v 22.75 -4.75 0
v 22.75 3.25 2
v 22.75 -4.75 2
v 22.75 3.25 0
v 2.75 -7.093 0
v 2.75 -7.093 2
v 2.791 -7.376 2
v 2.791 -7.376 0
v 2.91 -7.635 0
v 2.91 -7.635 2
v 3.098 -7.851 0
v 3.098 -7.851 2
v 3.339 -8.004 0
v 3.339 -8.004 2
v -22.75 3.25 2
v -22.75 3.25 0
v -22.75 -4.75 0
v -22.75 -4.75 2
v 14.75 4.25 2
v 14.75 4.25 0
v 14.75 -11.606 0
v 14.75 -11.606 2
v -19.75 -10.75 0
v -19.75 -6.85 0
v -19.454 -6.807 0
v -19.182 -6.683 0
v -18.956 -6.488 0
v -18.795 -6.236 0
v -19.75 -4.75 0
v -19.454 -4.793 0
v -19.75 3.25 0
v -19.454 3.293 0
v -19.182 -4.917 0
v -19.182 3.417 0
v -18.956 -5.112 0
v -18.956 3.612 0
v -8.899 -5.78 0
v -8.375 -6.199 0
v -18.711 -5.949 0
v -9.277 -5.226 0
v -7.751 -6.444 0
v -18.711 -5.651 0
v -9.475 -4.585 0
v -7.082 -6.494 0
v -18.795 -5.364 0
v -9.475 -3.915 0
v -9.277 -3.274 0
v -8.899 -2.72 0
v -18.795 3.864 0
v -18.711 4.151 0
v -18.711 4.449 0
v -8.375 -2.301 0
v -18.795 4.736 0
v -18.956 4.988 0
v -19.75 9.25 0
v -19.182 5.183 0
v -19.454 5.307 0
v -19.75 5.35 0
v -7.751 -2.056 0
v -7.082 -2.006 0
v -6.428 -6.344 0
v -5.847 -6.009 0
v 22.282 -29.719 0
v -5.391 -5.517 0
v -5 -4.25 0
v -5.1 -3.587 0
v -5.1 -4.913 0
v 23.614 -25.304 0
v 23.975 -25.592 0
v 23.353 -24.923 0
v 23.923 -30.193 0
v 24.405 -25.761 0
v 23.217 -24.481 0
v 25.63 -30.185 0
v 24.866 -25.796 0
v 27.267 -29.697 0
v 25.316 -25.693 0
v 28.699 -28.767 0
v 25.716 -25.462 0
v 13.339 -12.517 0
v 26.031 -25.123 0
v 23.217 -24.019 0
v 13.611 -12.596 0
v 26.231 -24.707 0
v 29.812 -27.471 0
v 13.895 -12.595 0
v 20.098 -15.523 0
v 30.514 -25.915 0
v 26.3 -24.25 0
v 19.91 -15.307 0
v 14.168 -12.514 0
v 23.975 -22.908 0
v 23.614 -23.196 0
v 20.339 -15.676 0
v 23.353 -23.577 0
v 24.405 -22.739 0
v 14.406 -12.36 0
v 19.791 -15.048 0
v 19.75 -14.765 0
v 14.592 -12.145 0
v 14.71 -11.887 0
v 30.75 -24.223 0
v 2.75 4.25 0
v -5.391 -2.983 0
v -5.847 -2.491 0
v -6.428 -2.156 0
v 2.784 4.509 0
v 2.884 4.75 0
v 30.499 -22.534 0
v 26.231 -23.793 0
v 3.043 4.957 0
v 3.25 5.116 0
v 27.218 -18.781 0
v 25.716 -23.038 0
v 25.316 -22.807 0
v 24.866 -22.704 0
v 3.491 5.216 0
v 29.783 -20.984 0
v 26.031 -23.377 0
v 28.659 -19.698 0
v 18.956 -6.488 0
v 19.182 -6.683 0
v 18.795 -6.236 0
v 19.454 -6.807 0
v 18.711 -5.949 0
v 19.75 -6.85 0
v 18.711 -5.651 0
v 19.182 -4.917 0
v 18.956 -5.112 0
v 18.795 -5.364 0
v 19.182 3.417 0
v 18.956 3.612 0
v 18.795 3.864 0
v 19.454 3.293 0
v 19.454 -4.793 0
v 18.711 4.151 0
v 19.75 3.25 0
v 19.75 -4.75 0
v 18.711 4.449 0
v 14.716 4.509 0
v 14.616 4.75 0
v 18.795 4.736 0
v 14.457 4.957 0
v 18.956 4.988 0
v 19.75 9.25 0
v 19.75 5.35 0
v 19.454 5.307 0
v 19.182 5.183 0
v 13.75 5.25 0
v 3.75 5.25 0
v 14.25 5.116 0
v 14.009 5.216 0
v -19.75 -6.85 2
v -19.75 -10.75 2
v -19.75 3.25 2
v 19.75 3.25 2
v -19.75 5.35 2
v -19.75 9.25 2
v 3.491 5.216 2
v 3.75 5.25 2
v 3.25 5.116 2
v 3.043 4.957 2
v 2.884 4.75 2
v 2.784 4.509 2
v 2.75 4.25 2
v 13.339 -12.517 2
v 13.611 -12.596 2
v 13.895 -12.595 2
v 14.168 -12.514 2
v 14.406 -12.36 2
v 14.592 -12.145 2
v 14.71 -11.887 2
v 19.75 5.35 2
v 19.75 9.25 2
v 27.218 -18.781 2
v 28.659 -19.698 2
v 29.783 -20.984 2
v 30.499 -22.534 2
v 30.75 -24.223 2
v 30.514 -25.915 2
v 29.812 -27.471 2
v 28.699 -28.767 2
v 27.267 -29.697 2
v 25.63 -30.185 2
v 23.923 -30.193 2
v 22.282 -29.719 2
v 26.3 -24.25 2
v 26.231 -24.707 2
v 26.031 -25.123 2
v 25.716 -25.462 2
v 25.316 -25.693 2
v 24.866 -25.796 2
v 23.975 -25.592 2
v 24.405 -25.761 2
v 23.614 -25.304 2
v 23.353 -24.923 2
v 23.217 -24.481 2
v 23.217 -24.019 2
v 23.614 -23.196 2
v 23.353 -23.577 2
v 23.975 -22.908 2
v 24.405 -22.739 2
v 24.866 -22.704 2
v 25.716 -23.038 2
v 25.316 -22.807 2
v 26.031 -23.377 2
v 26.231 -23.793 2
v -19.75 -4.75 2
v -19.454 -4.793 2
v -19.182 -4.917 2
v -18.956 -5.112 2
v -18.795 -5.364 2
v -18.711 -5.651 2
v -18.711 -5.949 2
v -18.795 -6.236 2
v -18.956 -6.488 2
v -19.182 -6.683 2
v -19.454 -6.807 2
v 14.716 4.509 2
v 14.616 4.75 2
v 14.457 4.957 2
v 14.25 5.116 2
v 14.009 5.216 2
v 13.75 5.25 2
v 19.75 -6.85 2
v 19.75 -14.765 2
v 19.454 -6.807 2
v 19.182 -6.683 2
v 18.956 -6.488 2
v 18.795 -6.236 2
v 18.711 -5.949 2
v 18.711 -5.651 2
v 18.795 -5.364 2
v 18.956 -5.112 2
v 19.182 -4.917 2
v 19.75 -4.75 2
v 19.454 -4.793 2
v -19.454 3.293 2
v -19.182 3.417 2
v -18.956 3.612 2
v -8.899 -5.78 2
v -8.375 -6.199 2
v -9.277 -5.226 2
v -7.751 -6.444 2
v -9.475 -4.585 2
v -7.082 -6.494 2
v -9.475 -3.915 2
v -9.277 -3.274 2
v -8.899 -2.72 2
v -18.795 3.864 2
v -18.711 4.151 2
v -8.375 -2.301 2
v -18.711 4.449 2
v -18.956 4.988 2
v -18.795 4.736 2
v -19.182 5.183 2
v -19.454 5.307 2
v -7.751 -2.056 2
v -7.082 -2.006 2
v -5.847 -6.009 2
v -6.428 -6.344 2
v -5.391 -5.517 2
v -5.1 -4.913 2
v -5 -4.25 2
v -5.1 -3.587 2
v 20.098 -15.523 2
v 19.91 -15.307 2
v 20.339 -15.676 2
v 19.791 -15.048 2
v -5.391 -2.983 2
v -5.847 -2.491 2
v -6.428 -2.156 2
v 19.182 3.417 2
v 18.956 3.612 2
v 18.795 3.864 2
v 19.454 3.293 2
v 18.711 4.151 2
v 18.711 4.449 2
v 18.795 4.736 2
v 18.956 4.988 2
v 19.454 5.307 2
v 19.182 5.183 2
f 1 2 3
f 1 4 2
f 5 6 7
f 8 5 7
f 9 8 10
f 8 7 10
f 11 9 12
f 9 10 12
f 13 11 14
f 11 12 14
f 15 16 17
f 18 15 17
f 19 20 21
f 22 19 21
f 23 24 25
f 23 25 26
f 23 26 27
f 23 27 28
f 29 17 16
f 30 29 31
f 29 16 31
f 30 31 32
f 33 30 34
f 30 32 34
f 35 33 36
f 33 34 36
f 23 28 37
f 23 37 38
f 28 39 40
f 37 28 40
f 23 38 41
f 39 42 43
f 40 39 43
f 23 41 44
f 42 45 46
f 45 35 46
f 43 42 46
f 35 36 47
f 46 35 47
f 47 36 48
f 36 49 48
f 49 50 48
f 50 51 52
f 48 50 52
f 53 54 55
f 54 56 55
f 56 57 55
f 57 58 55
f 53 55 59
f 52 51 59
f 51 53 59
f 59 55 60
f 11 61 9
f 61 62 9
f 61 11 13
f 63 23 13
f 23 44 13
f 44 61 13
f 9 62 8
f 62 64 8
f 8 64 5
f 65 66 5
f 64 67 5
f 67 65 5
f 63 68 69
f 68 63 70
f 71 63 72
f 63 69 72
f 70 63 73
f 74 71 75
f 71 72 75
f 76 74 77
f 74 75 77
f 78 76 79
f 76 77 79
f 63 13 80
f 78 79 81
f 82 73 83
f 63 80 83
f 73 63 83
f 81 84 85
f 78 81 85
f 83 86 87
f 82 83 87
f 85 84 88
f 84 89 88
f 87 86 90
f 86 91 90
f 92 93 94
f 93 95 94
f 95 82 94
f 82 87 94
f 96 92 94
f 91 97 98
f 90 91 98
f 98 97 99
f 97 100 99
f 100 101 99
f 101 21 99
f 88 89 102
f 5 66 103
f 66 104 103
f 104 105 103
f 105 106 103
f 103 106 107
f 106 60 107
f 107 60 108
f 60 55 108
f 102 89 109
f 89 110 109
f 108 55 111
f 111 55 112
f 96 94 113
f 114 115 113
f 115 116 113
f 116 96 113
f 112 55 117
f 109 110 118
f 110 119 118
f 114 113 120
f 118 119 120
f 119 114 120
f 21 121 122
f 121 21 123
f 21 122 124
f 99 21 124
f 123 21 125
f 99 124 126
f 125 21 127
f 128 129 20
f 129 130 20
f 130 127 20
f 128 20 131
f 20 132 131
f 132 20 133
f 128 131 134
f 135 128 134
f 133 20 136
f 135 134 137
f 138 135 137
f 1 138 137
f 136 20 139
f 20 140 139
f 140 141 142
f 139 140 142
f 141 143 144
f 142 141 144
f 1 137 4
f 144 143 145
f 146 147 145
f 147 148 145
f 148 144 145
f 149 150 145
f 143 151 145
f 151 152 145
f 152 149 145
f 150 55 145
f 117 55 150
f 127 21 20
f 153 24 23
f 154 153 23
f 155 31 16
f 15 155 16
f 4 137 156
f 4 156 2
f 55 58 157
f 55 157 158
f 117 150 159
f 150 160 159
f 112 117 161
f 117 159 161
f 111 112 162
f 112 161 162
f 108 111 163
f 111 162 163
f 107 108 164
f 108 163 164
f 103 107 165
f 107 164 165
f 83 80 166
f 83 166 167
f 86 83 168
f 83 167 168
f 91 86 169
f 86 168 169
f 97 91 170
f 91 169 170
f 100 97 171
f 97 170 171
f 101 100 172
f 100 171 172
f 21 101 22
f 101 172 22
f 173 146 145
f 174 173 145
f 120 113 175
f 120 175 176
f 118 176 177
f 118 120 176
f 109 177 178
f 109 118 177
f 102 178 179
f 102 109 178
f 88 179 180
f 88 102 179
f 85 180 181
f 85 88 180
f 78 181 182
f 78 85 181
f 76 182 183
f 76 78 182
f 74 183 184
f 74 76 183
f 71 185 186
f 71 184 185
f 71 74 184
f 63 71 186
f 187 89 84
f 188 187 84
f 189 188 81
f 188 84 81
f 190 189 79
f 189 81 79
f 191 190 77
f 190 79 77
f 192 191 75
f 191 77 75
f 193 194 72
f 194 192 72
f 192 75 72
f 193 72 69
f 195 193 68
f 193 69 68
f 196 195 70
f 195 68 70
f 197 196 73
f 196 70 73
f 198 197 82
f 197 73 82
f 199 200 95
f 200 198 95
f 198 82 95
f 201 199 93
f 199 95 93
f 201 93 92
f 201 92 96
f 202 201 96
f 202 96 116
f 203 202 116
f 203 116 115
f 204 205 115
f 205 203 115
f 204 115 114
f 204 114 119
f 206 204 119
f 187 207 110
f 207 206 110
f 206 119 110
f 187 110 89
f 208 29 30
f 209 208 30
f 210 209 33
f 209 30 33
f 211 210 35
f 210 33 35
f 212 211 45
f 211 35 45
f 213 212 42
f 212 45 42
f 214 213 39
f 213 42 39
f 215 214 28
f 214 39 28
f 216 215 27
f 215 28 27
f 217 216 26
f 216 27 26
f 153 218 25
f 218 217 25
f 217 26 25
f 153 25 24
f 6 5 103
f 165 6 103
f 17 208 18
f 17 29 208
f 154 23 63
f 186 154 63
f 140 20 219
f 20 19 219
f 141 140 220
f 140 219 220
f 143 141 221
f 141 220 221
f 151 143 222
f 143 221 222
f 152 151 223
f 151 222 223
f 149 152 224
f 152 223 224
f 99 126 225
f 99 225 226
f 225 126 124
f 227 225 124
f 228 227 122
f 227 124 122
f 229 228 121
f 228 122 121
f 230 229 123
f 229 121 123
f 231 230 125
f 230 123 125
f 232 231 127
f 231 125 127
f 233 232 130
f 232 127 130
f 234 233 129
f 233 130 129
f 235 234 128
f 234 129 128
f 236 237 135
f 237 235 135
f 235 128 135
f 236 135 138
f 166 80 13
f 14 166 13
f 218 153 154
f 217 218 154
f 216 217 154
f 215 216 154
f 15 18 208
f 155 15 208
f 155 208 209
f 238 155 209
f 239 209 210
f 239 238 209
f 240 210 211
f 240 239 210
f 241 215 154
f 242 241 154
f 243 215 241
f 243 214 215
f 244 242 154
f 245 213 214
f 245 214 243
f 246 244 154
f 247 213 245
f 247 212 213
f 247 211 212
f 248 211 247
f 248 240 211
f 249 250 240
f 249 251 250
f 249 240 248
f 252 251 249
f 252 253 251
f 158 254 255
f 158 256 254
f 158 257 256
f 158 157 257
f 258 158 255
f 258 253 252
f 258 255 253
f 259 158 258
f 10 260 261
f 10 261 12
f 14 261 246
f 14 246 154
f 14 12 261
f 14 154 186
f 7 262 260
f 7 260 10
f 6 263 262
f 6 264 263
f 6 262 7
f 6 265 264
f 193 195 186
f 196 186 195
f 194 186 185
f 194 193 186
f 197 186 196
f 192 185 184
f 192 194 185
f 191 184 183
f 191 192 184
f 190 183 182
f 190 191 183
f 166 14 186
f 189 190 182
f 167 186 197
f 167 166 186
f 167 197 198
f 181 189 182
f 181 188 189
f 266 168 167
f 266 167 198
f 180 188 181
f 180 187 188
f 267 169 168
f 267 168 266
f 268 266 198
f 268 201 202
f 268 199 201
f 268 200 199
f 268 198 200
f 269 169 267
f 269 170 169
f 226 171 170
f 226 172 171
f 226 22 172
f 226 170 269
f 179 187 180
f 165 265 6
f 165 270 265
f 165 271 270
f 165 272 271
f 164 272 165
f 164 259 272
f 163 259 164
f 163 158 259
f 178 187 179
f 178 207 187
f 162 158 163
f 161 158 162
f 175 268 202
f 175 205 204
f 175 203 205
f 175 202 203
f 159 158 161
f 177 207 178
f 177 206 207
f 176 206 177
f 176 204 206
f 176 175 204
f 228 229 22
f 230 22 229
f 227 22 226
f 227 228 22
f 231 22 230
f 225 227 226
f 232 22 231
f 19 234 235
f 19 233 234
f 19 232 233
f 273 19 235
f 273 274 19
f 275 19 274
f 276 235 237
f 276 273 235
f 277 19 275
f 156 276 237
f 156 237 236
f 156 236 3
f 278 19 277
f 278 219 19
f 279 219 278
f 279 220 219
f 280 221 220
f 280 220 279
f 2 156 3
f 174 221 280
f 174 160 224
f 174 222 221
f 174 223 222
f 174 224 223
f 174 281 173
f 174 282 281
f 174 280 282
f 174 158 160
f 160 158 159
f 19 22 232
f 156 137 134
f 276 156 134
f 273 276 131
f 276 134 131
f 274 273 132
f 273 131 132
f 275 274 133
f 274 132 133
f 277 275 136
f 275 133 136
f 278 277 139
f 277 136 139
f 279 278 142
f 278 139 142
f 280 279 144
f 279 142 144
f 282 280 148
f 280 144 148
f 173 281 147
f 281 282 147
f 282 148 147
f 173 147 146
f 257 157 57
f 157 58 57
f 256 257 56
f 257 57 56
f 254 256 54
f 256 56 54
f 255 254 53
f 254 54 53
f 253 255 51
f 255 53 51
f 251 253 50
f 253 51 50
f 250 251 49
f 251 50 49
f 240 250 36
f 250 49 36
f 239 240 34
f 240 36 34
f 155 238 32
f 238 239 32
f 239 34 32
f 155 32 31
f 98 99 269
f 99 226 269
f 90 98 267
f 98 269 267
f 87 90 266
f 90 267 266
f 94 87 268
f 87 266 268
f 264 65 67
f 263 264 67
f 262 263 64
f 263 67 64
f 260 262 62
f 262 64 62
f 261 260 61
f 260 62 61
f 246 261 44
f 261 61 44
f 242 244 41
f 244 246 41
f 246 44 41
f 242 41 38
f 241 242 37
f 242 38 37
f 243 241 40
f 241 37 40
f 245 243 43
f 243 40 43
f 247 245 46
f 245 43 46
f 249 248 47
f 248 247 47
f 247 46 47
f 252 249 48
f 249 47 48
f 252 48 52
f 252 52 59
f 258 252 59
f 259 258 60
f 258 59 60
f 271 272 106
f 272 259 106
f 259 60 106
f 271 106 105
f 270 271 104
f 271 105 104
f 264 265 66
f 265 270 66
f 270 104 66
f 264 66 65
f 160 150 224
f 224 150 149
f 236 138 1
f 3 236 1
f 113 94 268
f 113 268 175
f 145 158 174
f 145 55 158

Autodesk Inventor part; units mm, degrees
ref_plane "YZ Plane" through (0, 0, 0) normal (1, 0, 0) x (0, 1, 0)
ref_plane "XZ Plane" through (0, 0, 0) normal (0, 1, 0) x (-1, 0, 0)
ref_plane "XY Plane" through (0, 0, 0) normal (0, 0, 1) x (1, 0, 0)
sketch "スケッチ1" plane through (0, 0, 0) normal (0, 0, 1) x (1, 0, 0)
  line L0 (-19.75, 25.75) -> (19.75, 25.75) construction
  line L1 (19.75, 25.75) -> (19.75, -25.75) construction
  line L2 (19.75, -25.75) -> (-19.75, -25.75) construction
  line L3 (-19.75, -25.75) -> (-19.75, 25.75) construction
  line L4 (-19.75, 25.75) -> (19.75, -25.75) construction
  line L5 (19.75, 25.75) -> (-19.75, -25.75) construction
  circle A0 centre (24.75, -24.25) radius 1.55
  circle A1 centre (-7.25, -4.25) radius 2.25
  line L6 (0, 25.75) -> (0, -25.75) construction
  line L7 (-19.75, 3.25) -> (-22.75, 3.25)
  line L8 (-22.75, 3.25) -> (-22.75, -4.75)
  arc A2 (-19.75, 3.25) -> (-19.75, 5.35) centre (-19.75, 4.3) ccw
  line L9 (-22.75, -0.75) -> (-19.75, -0.75) construction
  line L10 (-19.75, -4.75) -> (-22.75, -4.75)
  arc A3 (-19.75, -6.85) -> (-19.75, -4.75) centre (-19.75, -5.8) ccw
  line L11 (-19.75, 5.35) -> (-19.75, 9.25)
  line L12 (-19.75, 9.25) -> (19.75, 9.25)
  line L13 (22.75, 3.25) -> (22.75, -4.75)
  arc A4 (19.75, 5.35) -> (19.75, 3.25) centre (19.75, 4.3) ccw
  line L14 (19.75, -4.75) -> (22.75, -4.75)
  arc A5 (19.75, -4.75) -> (19.75, -6.85) centre (19.75, -5.8) ccw
  line L15 (19.75, 5.35) -> (19.75, 9.25)
  line L16 (19.75, 3.25) -> (22.75, 3.25)
  arc A6 (22.2819, -29.7189) -> (27.2181, -18.7811) centre (24.75, -24.25) ccw
  line L17 (-19.75, -6.85) -> (-19.75, -10.75)
  line L18 (-19.75, -10.75) -> (22.2819, -29.7189)
  line L19 (19.75, -6.85) -> (19.75, -15.4108)
  line L20 (19.75, -15.4108) -> (27.2181, -18.7811)
  circle A7 centre (-7.25, -4.25) radius 6 construction
  circle A8 centre (24.75, -24.25) radius 6 construction
  line L21 (2.75, 5.25) -> (14.75, 5.25)
  line L22 (14.75, 5.25) -> (14.75, -13.1543)
  line L23 (14.75, -13.1543) -> (2.75, -7.7388)
  line L24 (2.75, -7.7388) -> (2.75, 5.25)
  point P0 (0, 0)
  dimension "d0" = 39.5
  dimension "d1" = 51.5
  dimension "d2" = 3.1
  dimension "d3" = 4.5
  dimension "d4" = 32
  dimension "d5" = 20
  dimension "d6" = 3
  dimension "d7" = 1.05
  dimension "d8" = 8
  dimension "d9" = 26.5
  dimension "d11" = 30
  dimension "d12" = 12.5
  dimension "d13" = 6
  dimension "d14" = 12
  dimension "d19" = 12
  dimension "d20" = 12
  dimension "d21" = 4
  dimension "d22" = 5
  dimension "d24" = 4
extrude "押し出し1" add sketch "スケッチ1" along normal blind 2
fillet "フィレット1" radius 1 1 edges at (19.75, -15.4108, 1)
fillet "フィレット2" radius 1 4 edges at (2.75, 5.25, 1) (14.75, 5.25, 1) (2.75, -7.7388, 1) (14.75, -13.1543, 1)
equation "\"d24\" = d21"
properties part number "付け根_メインフレーム_1" material "アルミニウム 2014-T4"
